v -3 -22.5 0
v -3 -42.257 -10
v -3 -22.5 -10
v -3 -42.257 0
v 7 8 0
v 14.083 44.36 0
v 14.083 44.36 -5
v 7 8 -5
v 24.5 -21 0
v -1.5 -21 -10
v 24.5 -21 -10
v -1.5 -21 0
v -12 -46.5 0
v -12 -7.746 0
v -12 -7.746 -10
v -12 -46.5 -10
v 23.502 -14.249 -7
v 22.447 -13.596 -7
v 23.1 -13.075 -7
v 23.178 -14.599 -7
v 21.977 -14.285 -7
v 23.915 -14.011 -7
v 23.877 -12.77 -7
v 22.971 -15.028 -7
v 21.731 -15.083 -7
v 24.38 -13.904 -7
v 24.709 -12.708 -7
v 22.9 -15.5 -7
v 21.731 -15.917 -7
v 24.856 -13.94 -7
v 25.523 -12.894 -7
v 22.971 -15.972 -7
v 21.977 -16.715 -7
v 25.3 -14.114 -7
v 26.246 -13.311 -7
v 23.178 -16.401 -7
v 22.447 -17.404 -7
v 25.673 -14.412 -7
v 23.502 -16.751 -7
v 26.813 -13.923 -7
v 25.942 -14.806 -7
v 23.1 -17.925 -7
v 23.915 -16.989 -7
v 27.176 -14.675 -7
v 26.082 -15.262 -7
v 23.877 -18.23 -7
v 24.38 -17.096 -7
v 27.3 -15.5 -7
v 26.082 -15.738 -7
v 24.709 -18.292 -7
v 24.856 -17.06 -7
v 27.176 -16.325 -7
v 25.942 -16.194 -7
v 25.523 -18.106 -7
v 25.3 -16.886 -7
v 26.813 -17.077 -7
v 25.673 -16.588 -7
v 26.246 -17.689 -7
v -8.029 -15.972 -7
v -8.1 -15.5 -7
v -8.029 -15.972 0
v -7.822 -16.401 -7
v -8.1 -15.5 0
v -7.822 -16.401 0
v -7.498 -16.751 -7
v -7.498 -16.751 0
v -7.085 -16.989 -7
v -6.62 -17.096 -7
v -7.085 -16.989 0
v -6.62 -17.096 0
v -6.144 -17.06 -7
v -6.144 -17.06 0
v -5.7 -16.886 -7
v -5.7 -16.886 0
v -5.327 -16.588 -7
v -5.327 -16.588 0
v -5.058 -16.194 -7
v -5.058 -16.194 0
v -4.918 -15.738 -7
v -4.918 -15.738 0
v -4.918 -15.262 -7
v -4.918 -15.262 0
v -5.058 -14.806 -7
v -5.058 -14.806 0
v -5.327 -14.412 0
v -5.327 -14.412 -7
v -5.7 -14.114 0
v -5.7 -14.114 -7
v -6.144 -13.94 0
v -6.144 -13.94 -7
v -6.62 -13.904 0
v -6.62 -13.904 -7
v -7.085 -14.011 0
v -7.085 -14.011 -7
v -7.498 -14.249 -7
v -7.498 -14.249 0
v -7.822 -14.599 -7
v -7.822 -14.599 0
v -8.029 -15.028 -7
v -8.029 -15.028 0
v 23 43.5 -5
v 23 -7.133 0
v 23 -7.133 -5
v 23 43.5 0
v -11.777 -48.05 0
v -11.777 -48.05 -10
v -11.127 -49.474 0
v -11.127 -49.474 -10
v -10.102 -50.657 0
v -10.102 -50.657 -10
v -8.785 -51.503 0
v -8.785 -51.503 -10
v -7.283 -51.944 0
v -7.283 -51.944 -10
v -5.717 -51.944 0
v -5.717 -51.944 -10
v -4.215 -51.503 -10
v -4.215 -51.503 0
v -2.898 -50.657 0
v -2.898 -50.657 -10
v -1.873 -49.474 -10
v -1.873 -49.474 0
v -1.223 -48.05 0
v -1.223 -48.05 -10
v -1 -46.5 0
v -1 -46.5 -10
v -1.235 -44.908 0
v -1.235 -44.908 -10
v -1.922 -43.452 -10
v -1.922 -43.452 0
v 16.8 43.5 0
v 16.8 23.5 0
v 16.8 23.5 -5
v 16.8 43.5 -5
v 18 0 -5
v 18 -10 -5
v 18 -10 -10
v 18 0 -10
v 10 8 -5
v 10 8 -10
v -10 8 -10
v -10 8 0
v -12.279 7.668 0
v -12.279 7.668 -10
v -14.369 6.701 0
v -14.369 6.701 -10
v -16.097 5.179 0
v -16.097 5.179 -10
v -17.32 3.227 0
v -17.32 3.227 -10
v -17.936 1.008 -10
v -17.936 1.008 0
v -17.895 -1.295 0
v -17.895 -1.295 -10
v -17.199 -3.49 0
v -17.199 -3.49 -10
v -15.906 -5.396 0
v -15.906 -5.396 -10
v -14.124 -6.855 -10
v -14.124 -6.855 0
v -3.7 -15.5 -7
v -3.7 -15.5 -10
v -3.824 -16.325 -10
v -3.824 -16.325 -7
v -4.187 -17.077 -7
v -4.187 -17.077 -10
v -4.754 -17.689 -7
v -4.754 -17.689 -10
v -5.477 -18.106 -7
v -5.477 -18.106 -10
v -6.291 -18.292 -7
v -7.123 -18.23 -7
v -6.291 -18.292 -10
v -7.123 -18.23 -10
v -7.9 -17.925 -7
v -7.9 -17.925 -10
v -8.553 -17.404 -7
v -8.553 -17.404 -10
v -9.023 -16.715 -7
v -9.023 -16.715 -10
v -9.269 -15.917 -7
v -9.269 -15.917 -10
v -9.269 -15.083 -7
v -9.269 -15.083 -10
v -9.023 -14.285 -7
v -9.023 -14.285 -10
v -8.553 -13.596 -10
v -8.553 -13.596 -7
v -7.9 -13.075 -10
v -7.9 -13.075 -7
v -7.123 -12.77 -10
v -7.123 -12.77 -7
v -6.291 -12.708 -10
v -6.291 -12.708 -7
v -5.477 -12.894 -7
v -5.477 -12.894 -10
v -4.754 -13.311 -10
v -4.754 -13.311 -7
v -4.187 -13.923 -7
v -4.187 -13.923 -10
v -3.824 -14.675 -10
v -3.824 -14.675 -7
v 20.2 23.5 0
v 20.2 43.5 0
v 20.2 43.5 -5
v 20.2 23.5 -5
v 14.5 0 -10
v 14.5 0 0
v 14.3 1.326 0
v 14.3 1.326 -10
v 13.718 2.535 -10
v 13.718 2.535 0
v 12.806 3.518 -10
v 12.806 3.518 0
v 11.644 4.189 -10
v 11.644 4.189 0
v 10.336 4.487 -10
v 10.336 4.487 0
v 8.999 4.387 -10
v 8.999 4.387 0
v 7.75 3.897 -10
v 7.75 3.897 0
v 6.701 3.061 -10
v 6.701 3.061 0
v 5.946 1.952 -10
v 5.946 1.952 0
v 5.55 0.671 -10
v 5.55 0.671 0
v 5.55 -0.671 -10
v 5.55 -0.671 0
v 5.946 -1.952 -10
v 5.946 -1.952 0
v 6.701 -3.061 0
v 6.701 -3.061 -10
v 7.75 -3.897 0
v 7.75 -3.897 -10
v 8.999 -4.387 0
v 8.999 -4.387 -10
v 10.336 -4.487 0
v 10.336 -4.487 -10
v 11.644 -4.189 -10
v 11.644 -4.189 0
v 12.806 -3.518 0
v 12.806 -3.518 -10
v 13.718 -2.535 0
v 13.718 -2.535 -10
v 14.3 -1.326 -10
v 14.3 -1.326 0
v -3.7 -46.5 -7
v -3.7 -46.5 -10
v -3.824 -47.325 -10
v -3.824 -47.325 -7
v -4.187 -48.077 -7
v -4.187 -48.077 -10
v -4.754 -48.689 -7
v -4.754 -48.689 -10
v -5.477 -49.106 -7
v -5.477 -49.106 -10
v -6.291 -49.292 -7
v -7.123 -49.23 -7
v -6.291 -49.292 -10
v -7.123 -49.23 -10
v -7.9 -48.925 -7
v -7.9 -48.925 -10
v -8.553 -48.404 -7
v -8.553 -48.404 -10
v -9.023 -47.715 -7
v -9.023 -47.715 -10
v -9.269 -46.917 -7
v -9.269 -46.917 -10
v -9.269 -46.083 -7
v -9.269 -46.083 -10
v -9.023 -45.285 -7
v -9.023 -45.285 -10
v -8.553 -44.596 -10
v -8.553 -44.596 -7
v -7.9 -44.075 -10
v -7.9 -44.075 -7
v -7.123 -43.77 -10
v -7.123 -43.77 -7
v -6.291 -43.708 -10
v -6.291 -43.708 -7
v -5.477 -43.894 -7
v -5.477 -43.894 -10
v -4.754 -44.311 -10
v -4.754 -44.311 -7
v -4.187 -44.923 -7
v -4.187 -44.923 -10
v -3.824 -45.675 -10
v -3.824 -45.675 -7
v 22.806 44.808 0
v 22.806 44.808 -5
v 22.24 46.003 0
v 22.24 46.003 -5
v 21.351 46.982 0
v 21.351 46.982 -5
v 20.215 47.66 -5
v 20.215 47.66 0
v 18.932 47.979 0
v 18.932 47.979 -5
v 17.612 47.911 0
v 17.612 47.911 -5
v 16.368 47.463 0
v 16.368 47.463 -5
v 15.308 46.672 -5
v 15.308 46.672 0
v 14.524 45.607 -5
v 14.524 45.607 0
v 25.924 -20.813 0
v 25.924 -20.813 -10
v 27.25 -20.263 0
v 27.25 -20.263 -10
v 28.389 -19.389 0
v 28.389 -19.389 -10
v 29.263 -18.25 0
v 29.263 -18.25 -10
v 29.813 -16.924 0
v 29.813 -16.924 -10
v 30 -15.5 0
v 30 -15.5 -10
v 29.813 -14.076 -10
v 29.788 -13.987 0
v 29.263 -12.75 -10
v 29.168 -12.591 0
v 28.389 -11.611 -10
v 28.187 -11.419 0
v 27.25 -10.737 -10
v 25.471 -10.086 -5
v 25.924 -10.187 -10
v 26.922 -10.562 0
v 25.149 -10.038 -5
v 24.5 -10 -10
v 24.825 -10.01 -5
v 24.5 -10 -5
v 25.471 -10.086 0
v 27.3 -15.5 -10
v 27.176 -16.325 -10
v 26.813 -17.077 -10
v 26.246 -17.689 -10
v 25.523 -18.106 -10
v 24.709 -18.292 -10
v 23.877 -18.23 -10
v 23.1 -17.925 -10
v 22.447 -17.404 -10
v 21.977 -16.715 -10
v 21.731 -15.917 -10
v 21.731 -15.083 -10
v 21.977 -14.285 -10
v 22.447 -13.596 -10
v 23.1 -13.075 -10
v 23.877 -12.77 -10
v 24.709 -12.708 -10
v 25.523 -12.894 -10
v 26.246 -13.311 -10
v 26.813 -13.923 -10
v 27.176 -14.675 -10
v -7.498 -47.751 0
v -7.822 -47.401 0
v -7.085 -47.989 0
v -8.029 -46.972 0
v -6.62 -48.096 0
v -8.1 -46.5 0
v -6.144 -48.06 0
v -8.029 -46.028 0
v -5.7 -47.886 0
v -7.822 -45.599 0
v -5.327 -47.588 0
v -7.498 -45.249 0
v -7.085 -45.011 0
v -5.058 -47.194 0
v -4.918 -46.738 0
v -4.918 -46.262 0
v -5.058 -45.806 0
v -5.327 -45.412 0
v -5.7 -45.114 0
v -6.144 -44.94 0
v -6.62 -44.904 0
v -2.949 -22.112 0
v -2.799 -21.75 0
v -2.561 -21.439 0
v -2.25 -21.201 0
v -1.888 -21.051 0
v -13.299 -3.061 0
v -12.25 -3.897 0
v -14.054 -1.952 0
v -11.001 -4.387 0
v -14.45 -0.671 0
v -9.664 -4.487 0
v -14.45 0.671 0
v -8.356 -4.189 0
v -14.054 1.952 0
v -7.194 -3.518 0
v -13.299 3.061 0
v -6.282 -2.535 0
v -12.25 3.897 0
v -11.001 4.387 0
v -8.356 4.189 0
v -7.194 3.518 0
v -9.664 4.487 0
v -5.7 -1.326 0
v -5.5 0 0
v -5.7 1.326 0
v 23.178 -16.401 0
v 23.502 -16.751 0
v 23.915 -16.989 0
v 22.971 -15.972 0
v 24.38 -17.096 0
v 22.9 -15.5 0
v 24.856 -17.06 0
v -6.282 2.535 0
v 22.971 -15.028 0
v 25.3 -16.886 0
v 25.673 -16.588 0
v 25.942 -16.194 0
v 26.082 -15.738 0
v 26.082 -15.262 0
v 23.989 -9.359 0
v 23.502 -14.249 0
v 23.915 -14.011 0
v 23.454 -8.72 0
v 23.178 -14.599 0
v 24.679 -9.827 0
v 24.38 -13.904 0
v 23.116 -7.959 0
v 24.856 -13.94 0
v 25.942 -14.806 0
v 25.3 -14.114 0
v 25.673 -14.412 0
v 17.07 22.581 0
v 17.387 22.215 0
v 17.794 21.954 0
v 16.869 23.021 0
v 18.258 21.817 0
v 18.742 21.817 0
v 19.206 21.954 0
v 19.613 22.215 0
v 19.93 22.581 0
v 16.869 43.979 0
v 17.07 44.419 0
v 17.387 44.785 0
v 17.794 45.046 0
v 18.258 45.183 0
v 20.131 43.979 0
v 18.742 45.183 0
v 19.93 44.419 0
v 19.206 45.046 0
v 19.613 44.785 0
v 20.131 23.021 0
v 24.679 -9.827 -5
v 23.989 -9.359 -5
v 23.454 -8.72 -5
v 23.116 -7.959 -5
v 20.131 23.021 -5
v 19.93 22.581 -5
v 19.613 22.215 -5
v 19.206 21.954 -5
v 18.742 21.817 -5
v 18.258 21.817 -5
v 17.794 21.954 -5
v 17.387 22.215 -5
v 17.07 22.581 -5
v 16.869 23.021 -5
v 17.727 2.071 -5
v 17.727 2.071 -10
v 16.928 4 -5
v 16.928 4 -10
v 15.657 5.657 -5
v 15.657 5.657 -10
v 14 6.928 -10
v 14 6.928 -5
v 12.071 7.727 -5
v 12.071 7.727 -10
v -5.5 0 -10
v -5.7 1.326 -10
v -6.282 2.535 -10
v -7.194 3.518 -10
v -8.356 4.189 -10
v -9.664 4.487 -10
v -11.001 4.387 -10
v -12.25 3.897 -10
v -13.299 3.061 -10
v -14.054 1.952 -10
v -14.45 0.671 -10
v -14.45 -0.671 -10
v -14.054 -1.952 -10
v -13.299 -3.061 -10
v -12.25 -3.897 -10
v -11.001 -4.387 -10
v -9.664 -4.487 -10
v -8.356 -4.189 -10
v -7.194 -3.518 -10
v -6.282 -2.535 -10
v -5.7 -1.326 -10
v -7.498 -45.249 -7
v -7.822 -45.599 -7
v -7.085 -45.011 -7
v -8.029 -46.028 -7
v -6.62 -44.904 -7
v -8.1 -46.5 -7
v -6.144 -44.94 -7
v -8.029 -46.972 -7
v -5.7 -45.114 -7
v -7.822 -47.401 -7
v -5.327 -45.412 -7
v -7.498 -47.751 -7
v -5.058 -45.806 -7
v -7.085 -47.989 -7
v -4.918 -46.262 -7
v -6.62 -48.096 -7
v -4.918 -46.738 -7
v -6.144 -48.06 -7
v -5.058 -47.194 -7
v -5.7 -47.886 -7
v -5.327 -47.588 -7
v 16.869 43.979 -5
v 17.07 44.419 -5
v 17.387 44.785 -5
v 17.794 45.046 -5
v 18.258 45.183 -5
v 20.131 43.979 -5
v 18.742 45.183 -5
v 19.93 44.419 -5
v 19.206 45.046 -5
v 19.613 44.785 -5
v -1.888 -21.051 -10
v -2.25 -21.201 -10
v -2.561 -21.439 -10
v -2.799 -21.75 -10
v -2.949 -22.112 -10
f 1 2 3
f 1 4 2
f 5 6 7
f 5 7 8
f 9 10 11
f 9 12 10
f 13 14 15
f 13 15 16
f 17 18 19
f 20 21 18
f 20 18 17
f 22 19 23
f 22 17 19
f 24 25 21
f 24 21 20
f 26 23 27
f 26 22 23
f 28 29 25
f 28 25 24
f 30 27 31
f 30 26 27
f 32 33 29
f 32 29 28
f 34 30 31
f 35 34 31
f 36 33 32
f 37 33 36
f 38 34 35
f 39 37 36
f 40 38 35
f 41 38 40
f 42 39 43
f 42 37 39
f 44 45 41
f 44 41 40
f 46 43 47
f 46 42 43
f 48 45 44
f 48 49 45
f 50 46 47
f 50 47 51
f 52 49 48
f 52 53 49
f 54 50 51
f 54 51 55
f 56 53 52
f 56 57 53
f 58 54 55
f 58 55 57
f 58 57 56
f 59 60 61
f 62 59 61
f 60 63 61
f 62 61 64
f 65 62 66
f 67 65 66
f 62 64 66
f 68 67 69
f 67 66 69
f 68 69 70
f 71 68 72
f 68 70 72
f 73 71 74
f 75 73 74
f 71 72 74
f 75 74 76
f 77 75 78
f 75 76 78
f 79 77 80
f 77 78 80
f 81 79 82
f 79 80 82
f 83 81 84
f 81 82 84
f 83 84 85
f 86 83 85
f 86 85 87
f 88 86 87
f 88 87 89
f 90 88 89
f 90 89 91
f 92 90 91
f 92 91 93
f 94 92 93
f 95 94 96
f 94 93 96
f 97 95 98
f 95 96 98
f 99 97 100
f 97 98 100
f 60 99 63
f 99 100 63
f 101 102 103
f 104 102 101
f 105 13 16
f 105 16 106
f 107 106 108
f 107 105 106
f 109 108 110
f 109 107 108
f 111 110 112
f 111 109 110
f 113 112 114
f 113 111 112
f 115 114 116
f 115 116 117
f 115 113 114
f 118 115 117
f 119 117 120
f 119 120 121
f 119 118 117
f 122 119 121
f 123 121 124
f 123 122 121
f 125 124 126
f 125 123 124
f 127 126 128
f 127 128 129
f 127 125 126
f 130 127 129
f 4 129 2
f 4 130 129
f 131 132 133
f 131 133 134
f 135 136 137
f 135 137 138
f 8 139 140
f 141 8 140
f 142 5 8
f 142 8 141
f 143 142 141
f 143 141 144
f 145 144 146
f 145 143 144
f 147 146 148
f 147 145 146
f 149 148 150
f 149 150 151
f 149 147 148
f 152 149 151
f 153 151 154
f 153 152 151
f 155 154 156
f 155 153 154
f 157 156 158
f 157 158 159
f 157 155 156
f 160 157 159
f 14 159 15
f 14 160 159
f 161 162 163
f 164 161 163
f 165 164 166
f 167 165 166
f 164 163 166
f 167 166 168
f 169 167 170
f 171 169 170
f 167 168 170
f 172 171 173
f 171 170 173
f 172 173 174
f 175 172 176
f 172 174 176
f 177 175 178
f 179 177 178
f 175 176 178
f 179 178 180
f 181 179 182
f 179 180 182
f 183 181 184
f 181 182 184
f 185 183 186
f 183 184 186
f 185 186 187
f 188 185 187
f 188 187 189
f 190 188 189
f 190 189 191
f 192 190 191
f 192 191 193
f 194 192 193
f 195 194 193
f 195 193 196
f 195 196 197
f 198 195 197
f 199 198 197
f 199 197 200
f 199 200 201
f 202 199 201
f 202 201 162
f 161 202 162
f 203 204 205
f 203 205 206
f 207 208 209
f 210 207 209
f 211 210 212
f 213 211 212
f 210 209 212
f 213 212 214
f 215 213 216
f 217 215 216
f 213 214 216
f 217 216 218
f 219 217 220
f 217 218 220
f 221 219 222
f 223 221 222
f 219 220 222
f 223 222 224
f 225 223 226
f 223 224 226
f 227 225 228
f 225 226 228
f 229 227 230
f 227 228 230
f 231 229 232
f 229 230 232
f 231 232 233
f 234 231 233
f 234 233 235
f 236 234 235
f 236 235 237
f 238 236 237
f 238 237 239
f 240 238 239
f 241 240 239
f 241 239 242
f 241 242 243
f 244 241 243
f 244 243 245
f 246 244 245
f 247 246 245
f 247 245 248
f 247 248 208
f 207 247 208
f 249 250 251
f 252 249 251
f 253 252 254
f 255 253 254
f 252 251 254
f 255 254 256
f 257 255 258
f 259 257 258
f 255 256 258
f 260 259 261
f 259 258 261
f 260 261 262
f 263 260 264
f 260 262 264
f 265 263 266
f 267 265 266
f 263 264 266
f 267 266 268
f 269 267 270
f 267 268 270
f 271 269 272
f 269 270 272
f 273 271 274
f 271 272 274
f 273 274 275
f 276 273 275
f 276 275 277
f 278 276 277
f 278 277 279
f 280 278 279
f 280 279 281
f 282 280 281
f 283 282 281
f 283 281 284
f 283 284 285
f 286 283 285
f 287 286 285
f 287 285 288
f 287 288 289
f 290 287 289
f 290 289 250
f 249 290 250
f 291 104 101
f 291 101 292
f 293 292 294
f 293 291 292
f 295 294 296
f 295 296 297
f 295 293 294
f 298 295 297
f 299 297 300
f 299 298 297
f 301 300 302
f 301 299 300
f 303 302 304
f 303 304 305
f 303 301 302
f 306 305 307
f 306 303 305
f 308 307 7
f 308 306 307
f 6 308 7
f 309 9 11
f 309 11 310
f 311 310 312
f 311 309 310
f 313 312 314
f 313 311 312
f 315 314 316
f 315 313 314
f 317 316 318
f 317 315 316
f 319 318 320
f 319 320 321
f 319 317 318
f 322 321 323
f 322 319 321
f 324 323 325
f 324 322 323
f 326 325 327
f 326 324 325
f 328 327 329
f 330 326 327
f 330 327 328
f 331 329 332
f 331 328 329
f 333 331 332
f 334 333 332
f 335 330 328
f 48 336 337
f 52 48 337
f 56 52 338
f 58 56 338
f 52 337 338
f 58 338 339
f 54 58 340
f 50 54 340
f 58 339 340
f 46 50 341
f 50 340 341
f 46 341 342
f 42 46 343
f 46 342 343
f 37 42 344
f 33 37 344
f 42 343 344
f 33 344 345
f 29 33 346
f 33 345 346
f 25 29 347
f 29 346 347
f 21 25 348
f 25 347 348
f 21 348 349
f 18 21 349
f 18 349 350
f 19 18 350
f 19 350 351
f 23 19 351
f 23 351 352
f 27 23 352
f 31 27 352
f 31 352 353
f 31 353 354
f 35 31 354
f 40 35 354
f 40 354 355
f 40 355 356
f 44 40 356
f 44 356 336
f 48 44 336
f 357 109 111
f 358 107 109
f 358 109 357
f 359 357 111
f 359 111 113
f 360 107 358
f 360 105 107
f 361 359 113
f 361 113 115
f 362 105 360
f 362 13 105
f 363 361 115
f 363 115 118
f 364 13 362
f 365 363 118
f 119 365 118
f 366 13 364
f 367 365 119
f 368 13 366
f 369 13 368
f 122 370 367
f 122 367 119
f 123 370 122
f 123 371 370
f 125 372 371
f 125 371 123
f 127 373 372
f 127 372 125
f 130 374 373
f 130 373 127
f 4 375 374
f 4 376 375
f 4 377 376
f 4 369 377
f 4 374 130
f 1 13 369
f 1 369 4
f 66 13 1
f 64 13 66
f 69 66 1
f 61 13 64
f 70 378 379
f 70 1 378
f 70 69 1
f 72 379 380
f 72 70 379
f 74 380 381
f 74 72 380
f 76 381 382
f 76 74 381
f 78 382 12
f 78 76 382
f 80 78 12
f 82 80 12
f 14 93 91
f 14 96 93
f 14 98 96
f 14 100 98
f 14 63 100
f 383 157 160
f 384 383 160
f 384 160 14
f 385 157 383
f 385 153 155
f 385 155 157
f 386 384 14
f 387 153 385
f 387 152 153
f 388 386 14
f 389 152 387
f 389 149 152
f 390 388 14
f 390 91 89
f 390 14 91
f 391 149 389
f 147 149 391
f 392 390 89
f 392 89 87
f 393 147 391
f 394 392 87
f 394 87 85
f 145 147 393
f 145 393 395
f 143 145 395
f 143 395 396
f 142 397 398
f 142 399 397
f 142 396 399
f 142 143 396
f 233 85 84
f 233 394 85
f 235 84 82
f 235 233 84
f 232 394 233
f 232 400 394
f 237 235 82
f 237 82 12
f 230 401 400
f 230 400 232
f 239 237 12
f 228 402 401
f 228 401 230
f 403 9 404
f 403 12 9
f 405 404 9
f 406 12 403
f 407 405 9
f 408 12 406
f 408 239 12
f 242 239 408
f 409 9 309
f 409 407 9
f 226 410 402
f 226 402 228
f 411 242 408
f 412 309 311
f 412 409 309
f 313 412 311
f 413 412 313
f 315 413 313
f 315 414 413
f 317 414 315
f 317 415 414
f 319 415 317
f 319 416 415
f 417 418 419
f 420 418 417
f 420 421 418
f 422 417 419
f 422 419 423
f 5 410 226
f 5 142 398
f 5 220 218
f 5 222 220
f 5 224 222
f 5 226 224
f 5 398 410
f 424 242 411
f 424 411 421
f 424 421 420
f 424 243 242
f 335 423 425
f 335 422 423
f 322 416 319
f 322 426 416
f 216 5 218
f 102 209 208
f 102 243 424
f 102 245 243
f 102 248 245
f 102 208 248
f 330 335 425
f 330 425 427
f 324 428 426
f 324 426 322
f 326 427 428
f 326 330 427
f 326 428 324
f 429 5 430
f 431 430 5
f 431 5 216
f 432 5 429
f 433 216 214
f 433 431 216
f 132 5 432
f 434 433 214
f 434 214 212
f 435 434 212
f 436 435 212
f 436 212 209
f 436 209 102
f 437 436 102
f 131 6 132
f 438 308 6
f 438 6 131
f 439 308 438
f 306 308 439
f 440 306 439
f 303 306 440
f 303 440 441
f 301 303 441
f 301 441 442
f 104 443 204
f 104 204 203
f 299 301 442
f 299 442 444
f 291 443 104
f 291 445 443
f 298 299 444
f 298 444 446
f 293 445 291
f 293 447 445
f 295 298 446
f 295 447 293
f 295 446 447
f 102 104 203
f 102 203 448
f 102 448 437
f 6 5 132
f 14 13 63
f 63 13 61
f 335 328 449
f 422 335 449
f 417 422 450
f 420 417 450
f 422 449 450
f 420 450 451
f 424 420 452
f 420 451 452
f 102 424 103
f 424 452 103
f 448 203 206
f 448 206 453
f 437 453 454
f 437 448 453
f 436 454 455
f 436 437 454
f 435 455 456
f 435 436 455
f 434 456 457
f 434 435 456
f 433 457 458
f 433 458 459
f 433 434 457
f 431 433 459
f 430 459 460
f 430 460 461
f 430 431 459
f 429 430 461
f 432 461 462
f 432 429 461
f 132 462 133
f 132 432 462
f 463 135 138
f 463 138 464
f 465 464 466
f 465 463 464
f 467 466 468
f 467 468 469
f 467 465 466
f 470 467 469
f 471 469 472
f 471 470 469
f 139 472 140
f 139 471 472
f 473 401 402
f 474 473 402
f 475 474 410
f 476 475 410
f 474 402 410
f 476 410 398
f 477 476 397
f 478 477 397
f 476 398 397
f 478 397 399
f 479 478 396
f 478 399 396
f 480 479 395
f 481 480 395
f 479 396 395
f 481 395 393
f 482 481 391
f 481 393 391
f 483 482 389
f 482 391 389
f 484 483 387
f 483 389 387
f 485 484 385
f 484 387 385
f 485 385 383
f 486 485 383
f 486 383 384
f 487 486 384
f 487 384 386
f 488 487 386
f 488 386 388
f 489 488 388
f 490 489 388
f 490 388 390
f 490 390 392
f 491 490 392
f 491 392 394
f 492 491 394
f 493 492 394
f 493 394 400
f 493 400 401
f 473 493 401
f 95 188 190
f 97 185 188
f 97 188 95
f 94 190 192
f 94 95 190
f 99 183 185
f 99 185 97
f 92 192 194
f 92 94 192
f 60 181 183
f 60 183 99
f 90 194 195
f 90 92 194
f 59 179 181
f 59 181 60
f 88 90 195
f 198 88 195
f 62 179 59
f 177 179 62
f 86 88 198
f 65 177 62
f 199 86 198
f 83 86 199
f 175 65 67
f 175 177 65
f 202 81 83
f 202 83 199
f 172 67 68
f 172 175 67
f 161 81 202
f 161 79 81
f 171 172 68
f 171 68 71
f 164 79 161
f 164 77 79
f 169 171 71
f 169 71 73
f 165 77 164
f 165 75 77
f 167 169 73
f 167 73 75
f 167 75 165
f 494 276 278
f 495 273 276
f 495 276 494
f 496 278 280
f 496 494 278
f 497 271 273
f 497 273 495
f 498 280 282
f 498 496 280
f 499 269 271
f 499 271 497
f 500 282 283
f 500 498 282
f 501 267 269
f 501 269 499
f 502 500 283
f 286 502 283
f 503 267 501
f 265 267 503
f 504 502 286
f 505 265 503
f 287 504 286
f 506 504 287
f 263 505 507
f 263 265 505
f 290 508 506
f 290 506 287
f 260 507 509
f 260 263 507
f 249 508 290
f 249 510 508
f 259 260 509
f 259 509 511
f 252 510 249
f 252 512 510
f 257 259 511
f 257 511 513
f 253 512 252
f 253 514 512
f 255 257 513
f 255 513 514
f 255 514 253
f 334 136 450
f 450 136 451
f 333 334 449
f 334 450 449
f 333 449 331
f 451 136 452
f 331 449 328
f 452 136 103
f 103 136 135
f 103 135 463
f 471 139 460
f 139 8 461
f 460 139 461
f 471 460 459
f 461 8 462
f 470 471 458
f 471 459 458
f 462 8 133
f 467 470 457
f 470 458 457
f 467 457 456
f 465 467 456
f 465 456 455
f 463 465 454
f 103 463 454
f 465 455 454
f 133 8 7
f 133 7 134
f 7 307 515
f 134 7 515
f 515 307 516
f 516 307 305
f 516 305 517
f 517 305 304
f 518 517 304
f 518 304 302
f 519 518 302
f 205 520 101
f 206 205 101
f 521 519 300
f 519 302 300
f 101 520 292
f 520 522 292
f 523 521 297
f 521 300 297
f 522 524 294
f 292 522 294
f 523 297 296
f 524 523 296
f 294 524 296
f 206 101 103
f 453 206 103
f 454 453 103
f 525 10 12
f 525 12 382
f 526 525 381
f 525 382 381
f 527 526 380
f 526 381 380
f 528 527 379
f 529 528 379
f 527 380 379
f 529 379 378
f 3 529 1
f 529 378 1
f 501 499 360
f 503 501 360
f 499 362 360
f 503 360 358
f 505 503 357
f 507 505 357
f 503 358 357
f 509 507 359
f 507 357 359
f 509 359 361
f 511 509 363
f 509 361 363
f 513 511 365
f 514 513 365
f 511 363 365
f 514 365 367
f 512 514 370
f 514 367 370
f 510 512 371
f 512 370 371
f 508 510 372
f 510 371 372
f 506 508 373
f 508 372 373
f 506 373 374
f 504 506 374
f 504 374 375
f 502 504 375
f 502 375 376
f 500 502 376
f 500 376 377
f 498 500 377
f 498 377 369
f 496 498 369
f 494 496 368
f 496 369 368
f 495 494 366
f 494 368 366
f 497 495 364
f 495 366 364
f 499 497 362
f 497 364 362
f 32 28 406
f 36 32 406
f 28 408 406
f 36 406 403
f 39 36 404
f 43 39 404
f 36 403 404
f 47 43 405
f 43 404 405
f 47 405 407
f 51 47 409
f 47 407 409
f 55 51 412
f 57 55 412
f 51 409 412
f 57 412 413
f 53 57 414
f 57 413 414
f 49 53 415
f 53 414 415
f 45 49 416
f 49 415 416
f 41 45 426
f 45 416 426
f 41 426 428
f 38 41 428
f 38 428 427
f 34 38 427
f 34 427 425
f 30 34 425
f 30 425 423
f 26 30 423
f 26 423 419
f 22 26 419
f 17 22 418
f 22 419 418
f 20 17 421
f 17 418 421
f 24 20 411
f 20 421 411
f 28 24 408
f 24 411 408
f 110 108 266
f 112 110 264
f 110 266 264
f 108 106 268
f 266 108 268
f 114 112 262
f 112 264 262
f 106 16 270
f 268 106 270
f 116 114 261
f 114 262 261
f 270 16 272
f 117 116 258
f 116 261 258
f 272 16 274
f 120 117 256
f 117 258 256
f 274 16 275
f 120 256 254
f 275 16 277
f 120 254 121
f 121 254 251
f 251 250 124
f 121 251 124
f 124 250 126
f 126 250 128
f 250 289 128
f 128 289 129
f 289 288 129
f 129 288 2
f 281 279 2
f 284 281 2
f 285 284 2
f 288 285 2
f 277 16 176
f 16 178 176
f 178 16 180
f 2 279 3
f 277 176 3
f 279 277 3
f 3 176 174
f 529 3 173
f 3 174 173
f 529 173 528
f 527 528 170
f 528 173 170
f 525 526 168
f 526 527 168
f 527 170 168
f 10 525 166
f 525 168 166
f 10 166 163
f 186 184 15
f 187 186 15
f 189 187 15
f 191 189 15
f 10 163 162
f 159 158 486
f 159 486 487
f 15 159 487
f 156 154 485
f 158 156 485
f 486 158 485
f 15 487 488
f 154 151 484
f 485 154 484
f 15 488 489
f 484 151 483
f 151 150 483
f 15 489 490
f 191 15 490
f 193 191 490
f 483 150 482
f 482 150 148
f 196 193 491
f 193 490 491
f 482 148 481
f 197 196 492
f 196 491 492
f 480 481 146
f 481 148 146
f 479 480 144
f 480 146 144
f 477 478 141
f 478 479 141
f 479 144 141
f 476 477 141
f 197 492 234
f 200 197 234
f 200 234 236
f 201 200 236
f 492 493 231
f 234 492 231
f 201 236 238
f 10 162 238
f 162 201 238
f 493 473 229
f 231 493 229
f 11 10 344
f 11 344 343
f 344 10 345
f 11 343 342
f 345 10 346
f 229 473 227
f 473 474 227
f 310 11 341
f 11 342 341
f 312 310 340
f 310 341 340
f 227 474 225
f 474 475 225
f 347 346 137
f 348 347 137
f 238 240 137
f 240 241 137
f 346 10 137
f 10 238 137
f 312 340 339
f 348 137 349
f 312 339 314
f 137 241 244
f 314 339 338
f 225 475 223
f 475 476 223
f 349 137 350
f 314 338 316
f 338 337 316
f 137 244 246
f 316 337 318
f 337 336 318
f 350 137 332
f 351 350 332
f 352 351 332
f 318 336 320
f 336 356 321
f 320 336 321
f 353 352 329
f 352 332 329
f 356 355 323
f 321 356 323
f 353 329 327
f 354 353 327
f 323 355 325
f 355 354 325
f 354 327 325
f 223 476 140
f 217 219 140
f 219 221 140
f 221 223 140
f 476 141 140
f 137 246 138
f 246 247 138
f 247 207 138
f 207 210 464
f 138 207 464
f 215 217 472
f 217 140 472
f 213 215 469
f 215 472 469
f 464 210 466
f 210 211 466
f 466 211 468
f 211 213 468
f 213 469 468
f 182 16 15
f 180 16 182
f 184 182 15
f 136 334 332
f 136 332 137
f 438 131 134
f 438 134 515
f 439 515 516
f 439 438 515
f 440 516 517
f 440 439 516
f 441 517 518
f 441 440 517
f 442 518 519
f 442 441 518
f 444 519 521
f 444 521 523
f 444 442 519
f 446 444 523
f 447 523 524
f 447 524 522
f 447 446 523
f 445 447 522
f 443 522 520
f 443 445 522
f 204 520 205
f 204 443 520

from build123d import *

# Parameters (mm, degrees)
F0_R           = 4.5
F1_DEPTH       = 5
F2_DEPTH       = 10
F4_D           = 3.2
F4_CBORE_D     = 5.6
F4_CBORE_DEPTH = 3
F5_T1_DEPTH    = 5
F6_R           = 1.5


# Not quite as in the source:
# - a fillet or chamfer that OpenCascade refuses, or shapes differently, is made with other operations: its cross-section is extruded or revolved along the edge and cut away or added
# - a feature names something its author has since deleted; it is built from what else it names


with BuildPart() as f1:
    # F0 (on Top) → F1 (new body)
    with BuildSketch(Plane.XY):
        with BuildLine():
            ThreePointArc((-12, -7.7459666924), (-5.1010205144, -6.3245553203), (-2, 0))
            ThreePointArc((-2, 0), (-4.3431457505, 5.6568542495), (-10, 8))
            ThreePointArc((-10, 8), (-17.9362375701, 1.0080343399), (-12, -7.7459666924))
        make_face()
        with Locations((-10, 0)):
            Circle(F0_R, mode=Mode.SUBTRACT)
        with BuildLine():
            ThreePointArc((-10, 8), (-4.3431457505, 5.6568542495), (-2, 0))
            ThreePointArc((-2, 0), (-5.1010205144, -6.3245553203), (-12, -7.7459666924))
            Line((-12, -7.7459666924), (-12, -15.5))
            ThreePointArc((-12, -15.5), (-6.5, -10), (-1, -15.5))
            ThreePointArc((-1, -15.5), (-1.5250628145, -17.8452078799), (-3, -19.7426406871))
            Line((-3, -19.7426406871), (-3, -21))
            Line((-3, -21), (18, -21))
            Line((18, -21), (18, -10))
            Line((18, -10), (18, 0))
            ThreePointArc((18, 0), (4.3431457505, -5.6568542495), (10, 8))
            Line((10, 8), (7, 8))
            Line((7, 8), (-10, 8))
        make_face()
        with BuildLine():
            Line((14.083025574, 44.3604283352), (7, 8))
            Line((7, 8), (10, 8))
            ThreePointArc((10, 8), (15.6568542495, 5.6568542495), (18, 0))
            Line((18, 0), (18, -10))
            Line((18, -10), (23, -10))
            Line((23, -10), (23, 43.5))
            ThreePointArc((23, 43.5), (22.2349698794, 40.9900199204), (20.2, 39.3334666688))
            Line((20.2, 39.3334666688), (20.2, 23.5))
            ThreePointArc((20.2, 23.5), (18.5, 21.8), (16.8, 23.5))
            Line((16.8, 23.5), (16.8, 39.3334666688))
            ThreePointArc((16.8, 39.3334666688), (14.5412211566, 41.3603574904), (14.083025574, 44.3604283352))
        make_face()
        with BuildLine():
            ThreePointArc((-1, -15.5), (-6.5, -10), (-12, -15.5))
            ThreePointArc((-12, -15.5), (-10.3890872965, -19.3890872965), (-6.5, -21))
            ThreePointArc((-6.5, -21), (-4.6405005753, -20.676124215), (-3, -19.7426406871))
            ThreePointArc((-3, -19.7426406871), (-1.5250628145, -17.8452078799), (-1, -15.5))
        make_face()
        with BuildLine():
            ThreePointArc((-6.5, -21), (-10.3890872965, -19.3890872965), (-12, -15.5))
            Line((-12, -15.5), (-12, -46.5))
            ThreePointArc((-12, -46.5), (-8.8452078799, -41.5250628145), (-3, -42.2573593129))
            Line((-3, -42.2573593129), (-3, -21))
            Line((-3, -21), (-6.5, -21))
        make_face()
        with BuildLine():
            ThreePointArc((23, 43.5), (18.9322123801, 47.9791955147), (14.083025574, 44.3604283352))
            ThreePointArc((14.083025574, 44.3604283352), (14.5412211566, 41.3603574904), (16.8, 39.3334666688))
            Line((16.8, 39.3334666688), (16.8, 43.5))
            ThreePointArc((16.8, 43.5), (18.5, 45.2), (20.2, 43.5))
            Line((20.2, 43.5), (20.2, 39.3334666688))
            ThreePointArc((20.2, 39.3334666688), (22.2349698794, 40.9900199204), (23, 43.5))
        make_face()
        with BuildLine():
            ThreePointArc((-3, -19.7426406871), (-4.6405005753, -20.676124215), (-6.5, -21))
            Line((-6.5, -21), (-3, -21))
            Line((-3, -21), (-3, -19.7426406871))
        make_face()
        with BuildLine():
            ThreePointArc((-3, -42.2573593129), (-8.8452078799, -41.5250628145), (-12, -46.5))
            ThreePointArc((-12, -46.5), (-6.5, -52), (-1, -46.5))
            ThreePointArc((-1, -46.5), (-1.5250628145, -44.1547921201), (-3, -42.2573593129))
        make_face()
        with BuildLine():
            Line((23, -10), (18, -10))
            Line((18, -10), (18, -21))
            Line((18, -21), (24.5, -21))
            ThreePointArc((24.5, -21), (19, -15.5), (24.5, -10))
            Line((24.5, -10), (23, -10))
        make_face()
        with BuildLine():
            ThreePointArc((30, -15.5), (28.3890872965, -11.6109127035), (24.5, -10))
            ThreePointArc((24.5, -10), (19, -15.5), (24.5, -21))
            ThreePointArc((24.5, -21), (28.3890872965, -19.3890872965), (30, -15.5))
        make_face()
        with BuildLine():
            ThreePointArc((18, 0), (15.6568542495, 5.6568542495), (10, 8))
            ThreePointArc((10, 8), (4.3431457505, -5.6568542495), (18, 0))
        make_face()
        with Locations((10, 0)):
            Circle(F0_R, mode=Mode.SUBTRACT)
    extrude(amount=-F1_DEPTH)

    # F0 (on Top) → F2 (join)
    with BuildSketch(Plane.XY):
        with BuildLine():
            ThreePointArc((30, -15.5), (28.3890872965, -11.6109127035), (24.5, -10))
            ThreePointArc((24.5, -10), (19, -15.5), (24.5, -21))
            ThreePointArc((24.5, -21), (28.3890872965, -19.3890872965), (30, -15.5))
        make_face()
        with BuildLine():
            ThreePointArc((-3, -42.2573593129), (-8.8452078799, -41.5250628145), (-12, -46.5))
            ThreePointArc((-12, -46.5), (-6.5, -52), (-1, -46.5))
            ThreePointArc((-1, -46.5), (-1.5250628145, -44.1547921201), (-3, -42.2573593129))
        make_face()
        with BuildLine():
            ThreePointArc((-12, -7.7459666924), (-5.1010205144, -6.3245553203), (-2, 0))
            ThreePointArc((-2, 0), (-4.3431457505, 5.6568542495), (-10, 8))
            ThreePointArc((-10, 8), (-17.9362375701, 1.0080343399), (-12, -7.7459666924))
        make_face()
        with Locations((-10, 0)):
            Circle(F0_R, mode=Mode.SUBTRACT)
        with BuildLine():
            ThreePointArc((-1, -15.5), (-6.5, -10), (-12, -15.5))
            ThreePointArc((-12, -15.5), (-10.3890872965, -19.3890872965), (-6.5, -21))
            ThreePointArc((-6.5, -21), (-4.6405005753, -20.676124215), (-3, -19.7426406871))
            ThreePointArc((-3, -19.7426406871), (-1.5250628145, -17.8452078799), (-1, -15.5))
        make_face()
        with BuildLine():
            ThreePointArc((-6.5, -21), (-10.3890872965, -19.3890872965), (-12, -15.5))
            Line((-12, -15.5), (-12, -46.5))
            ThreePointArc((-12, -46.5), (-8.8452078799, -41.5250628145), (-3, -42.2573593129))
            Line((-3, -42.2573593129), (-3, -21))
            Line((-3, -21), (-6.5, -21))
        make_face()
        with BuildLine():
            ThreePointArc((-3, -19.7426406871), (-4.6405005753, -20.676124215), (-6.5, -21))
            Line((-6.5, -21), (-3, -21))
            Line((-3, -21), (-3, -19.7426406871))
        make_face()
        with BuildLine():
            Line((23, -10), (18, -10))
            Line((18, -10), (18, -21))
            Line((18, -21), (24.5, -21))
            ThreePointArc((24.5, -21), (19, -15.5), (24.5, -10))
            Line((24.5, -10), (23, -10))
        make_face()
        with BuildLine():
            ThreePointArc((-10, 8), (-4.3431457505, 5.6568542495), (-2, 0))
            ThreePointArc((-2, 0), (-5.1010205144, -6.3245553203), (-12, -7.7459666924))
            Line((-12, -7.7459666924), (-12, -15.5))
            ThreePointArc((-12, -15.5), (-6.5, -10), (-1, -15.5))
            ThreePointArc((-1, -15.5), (-1.5250628145, -17.8452078799), (-3, -19.7426406871))
            Line((-3, -19.7426406871), (-3, -21))
            Line((-3, -21), (18, -21))
            Line((18, -21), (18, -10))
            Line((18, -10), (18, 0))
            ThreePointArc((18, 0), (4.3431457505, -5.6568542495), (10, 8))
            Line((10, 8), (7, 8))
            Line((7, 8), (-10, 8))
        make_face()
        with BuildLine():
            ThreePointArc((18, 0), (15.6568542495, 5.6568542495), (10, 8))
            ThreePointArc((10, 8), (4.3431457505, -5.6568542495), (18, 0))
        make_face()
        with Locations((10, 0)):
            Circle(F0_R, mode=Mode.SUBTRACT)
    extrude(amount=-F2_DEPTH)

    # F4 (through all)
    with Locations(Plane(origin=(0, 0, -10), x_dir=(1, 0, 0), z_dir=(0, 0, -1))):
        with Locations((-6.5, 46.5), (-6.5, 15.5), (24.5, 15.5)):
            CounterBoreHole(F4_D / 2, F4_CBORE_D / 2, F4_CBORE_DEPTH)

    # F5: fillet of radius 3 on 1 edges, made by hand

    # F5_s2 → F5_t1 (join)
    with BuildSketch(Plane.XY.offset(-5)):
        with BuildLine():
            ThreePointArc((25.4705882353, -10.0863174754), (23.6991050335, -9.0584665784), (23, -7.1333997347))
            Line((23, -7.1333997347), (22.7, -7.1333997347))
            Line((22.7, -7.1333997347), (22.7, -10))
            Line((22.7, -10), (23, -10.3))
            ThreePointArc((23, -10.3), (24.5, -10.3), (25.4176470588, -10.3816092494))
            Line((25.4176470588, -10.3816092494), (25.4705882353, -10.0863174754))
        make_face()
    extrude(amount=F5_T1_DEPTH)

    # F6
    f6_edges = [f1.edges().sort_by_distance(p)[0] for p in [
        (-3, -21, -5),
    ]]
    fillet(f6_edges, radius=F6_R)


solid = f1.part
